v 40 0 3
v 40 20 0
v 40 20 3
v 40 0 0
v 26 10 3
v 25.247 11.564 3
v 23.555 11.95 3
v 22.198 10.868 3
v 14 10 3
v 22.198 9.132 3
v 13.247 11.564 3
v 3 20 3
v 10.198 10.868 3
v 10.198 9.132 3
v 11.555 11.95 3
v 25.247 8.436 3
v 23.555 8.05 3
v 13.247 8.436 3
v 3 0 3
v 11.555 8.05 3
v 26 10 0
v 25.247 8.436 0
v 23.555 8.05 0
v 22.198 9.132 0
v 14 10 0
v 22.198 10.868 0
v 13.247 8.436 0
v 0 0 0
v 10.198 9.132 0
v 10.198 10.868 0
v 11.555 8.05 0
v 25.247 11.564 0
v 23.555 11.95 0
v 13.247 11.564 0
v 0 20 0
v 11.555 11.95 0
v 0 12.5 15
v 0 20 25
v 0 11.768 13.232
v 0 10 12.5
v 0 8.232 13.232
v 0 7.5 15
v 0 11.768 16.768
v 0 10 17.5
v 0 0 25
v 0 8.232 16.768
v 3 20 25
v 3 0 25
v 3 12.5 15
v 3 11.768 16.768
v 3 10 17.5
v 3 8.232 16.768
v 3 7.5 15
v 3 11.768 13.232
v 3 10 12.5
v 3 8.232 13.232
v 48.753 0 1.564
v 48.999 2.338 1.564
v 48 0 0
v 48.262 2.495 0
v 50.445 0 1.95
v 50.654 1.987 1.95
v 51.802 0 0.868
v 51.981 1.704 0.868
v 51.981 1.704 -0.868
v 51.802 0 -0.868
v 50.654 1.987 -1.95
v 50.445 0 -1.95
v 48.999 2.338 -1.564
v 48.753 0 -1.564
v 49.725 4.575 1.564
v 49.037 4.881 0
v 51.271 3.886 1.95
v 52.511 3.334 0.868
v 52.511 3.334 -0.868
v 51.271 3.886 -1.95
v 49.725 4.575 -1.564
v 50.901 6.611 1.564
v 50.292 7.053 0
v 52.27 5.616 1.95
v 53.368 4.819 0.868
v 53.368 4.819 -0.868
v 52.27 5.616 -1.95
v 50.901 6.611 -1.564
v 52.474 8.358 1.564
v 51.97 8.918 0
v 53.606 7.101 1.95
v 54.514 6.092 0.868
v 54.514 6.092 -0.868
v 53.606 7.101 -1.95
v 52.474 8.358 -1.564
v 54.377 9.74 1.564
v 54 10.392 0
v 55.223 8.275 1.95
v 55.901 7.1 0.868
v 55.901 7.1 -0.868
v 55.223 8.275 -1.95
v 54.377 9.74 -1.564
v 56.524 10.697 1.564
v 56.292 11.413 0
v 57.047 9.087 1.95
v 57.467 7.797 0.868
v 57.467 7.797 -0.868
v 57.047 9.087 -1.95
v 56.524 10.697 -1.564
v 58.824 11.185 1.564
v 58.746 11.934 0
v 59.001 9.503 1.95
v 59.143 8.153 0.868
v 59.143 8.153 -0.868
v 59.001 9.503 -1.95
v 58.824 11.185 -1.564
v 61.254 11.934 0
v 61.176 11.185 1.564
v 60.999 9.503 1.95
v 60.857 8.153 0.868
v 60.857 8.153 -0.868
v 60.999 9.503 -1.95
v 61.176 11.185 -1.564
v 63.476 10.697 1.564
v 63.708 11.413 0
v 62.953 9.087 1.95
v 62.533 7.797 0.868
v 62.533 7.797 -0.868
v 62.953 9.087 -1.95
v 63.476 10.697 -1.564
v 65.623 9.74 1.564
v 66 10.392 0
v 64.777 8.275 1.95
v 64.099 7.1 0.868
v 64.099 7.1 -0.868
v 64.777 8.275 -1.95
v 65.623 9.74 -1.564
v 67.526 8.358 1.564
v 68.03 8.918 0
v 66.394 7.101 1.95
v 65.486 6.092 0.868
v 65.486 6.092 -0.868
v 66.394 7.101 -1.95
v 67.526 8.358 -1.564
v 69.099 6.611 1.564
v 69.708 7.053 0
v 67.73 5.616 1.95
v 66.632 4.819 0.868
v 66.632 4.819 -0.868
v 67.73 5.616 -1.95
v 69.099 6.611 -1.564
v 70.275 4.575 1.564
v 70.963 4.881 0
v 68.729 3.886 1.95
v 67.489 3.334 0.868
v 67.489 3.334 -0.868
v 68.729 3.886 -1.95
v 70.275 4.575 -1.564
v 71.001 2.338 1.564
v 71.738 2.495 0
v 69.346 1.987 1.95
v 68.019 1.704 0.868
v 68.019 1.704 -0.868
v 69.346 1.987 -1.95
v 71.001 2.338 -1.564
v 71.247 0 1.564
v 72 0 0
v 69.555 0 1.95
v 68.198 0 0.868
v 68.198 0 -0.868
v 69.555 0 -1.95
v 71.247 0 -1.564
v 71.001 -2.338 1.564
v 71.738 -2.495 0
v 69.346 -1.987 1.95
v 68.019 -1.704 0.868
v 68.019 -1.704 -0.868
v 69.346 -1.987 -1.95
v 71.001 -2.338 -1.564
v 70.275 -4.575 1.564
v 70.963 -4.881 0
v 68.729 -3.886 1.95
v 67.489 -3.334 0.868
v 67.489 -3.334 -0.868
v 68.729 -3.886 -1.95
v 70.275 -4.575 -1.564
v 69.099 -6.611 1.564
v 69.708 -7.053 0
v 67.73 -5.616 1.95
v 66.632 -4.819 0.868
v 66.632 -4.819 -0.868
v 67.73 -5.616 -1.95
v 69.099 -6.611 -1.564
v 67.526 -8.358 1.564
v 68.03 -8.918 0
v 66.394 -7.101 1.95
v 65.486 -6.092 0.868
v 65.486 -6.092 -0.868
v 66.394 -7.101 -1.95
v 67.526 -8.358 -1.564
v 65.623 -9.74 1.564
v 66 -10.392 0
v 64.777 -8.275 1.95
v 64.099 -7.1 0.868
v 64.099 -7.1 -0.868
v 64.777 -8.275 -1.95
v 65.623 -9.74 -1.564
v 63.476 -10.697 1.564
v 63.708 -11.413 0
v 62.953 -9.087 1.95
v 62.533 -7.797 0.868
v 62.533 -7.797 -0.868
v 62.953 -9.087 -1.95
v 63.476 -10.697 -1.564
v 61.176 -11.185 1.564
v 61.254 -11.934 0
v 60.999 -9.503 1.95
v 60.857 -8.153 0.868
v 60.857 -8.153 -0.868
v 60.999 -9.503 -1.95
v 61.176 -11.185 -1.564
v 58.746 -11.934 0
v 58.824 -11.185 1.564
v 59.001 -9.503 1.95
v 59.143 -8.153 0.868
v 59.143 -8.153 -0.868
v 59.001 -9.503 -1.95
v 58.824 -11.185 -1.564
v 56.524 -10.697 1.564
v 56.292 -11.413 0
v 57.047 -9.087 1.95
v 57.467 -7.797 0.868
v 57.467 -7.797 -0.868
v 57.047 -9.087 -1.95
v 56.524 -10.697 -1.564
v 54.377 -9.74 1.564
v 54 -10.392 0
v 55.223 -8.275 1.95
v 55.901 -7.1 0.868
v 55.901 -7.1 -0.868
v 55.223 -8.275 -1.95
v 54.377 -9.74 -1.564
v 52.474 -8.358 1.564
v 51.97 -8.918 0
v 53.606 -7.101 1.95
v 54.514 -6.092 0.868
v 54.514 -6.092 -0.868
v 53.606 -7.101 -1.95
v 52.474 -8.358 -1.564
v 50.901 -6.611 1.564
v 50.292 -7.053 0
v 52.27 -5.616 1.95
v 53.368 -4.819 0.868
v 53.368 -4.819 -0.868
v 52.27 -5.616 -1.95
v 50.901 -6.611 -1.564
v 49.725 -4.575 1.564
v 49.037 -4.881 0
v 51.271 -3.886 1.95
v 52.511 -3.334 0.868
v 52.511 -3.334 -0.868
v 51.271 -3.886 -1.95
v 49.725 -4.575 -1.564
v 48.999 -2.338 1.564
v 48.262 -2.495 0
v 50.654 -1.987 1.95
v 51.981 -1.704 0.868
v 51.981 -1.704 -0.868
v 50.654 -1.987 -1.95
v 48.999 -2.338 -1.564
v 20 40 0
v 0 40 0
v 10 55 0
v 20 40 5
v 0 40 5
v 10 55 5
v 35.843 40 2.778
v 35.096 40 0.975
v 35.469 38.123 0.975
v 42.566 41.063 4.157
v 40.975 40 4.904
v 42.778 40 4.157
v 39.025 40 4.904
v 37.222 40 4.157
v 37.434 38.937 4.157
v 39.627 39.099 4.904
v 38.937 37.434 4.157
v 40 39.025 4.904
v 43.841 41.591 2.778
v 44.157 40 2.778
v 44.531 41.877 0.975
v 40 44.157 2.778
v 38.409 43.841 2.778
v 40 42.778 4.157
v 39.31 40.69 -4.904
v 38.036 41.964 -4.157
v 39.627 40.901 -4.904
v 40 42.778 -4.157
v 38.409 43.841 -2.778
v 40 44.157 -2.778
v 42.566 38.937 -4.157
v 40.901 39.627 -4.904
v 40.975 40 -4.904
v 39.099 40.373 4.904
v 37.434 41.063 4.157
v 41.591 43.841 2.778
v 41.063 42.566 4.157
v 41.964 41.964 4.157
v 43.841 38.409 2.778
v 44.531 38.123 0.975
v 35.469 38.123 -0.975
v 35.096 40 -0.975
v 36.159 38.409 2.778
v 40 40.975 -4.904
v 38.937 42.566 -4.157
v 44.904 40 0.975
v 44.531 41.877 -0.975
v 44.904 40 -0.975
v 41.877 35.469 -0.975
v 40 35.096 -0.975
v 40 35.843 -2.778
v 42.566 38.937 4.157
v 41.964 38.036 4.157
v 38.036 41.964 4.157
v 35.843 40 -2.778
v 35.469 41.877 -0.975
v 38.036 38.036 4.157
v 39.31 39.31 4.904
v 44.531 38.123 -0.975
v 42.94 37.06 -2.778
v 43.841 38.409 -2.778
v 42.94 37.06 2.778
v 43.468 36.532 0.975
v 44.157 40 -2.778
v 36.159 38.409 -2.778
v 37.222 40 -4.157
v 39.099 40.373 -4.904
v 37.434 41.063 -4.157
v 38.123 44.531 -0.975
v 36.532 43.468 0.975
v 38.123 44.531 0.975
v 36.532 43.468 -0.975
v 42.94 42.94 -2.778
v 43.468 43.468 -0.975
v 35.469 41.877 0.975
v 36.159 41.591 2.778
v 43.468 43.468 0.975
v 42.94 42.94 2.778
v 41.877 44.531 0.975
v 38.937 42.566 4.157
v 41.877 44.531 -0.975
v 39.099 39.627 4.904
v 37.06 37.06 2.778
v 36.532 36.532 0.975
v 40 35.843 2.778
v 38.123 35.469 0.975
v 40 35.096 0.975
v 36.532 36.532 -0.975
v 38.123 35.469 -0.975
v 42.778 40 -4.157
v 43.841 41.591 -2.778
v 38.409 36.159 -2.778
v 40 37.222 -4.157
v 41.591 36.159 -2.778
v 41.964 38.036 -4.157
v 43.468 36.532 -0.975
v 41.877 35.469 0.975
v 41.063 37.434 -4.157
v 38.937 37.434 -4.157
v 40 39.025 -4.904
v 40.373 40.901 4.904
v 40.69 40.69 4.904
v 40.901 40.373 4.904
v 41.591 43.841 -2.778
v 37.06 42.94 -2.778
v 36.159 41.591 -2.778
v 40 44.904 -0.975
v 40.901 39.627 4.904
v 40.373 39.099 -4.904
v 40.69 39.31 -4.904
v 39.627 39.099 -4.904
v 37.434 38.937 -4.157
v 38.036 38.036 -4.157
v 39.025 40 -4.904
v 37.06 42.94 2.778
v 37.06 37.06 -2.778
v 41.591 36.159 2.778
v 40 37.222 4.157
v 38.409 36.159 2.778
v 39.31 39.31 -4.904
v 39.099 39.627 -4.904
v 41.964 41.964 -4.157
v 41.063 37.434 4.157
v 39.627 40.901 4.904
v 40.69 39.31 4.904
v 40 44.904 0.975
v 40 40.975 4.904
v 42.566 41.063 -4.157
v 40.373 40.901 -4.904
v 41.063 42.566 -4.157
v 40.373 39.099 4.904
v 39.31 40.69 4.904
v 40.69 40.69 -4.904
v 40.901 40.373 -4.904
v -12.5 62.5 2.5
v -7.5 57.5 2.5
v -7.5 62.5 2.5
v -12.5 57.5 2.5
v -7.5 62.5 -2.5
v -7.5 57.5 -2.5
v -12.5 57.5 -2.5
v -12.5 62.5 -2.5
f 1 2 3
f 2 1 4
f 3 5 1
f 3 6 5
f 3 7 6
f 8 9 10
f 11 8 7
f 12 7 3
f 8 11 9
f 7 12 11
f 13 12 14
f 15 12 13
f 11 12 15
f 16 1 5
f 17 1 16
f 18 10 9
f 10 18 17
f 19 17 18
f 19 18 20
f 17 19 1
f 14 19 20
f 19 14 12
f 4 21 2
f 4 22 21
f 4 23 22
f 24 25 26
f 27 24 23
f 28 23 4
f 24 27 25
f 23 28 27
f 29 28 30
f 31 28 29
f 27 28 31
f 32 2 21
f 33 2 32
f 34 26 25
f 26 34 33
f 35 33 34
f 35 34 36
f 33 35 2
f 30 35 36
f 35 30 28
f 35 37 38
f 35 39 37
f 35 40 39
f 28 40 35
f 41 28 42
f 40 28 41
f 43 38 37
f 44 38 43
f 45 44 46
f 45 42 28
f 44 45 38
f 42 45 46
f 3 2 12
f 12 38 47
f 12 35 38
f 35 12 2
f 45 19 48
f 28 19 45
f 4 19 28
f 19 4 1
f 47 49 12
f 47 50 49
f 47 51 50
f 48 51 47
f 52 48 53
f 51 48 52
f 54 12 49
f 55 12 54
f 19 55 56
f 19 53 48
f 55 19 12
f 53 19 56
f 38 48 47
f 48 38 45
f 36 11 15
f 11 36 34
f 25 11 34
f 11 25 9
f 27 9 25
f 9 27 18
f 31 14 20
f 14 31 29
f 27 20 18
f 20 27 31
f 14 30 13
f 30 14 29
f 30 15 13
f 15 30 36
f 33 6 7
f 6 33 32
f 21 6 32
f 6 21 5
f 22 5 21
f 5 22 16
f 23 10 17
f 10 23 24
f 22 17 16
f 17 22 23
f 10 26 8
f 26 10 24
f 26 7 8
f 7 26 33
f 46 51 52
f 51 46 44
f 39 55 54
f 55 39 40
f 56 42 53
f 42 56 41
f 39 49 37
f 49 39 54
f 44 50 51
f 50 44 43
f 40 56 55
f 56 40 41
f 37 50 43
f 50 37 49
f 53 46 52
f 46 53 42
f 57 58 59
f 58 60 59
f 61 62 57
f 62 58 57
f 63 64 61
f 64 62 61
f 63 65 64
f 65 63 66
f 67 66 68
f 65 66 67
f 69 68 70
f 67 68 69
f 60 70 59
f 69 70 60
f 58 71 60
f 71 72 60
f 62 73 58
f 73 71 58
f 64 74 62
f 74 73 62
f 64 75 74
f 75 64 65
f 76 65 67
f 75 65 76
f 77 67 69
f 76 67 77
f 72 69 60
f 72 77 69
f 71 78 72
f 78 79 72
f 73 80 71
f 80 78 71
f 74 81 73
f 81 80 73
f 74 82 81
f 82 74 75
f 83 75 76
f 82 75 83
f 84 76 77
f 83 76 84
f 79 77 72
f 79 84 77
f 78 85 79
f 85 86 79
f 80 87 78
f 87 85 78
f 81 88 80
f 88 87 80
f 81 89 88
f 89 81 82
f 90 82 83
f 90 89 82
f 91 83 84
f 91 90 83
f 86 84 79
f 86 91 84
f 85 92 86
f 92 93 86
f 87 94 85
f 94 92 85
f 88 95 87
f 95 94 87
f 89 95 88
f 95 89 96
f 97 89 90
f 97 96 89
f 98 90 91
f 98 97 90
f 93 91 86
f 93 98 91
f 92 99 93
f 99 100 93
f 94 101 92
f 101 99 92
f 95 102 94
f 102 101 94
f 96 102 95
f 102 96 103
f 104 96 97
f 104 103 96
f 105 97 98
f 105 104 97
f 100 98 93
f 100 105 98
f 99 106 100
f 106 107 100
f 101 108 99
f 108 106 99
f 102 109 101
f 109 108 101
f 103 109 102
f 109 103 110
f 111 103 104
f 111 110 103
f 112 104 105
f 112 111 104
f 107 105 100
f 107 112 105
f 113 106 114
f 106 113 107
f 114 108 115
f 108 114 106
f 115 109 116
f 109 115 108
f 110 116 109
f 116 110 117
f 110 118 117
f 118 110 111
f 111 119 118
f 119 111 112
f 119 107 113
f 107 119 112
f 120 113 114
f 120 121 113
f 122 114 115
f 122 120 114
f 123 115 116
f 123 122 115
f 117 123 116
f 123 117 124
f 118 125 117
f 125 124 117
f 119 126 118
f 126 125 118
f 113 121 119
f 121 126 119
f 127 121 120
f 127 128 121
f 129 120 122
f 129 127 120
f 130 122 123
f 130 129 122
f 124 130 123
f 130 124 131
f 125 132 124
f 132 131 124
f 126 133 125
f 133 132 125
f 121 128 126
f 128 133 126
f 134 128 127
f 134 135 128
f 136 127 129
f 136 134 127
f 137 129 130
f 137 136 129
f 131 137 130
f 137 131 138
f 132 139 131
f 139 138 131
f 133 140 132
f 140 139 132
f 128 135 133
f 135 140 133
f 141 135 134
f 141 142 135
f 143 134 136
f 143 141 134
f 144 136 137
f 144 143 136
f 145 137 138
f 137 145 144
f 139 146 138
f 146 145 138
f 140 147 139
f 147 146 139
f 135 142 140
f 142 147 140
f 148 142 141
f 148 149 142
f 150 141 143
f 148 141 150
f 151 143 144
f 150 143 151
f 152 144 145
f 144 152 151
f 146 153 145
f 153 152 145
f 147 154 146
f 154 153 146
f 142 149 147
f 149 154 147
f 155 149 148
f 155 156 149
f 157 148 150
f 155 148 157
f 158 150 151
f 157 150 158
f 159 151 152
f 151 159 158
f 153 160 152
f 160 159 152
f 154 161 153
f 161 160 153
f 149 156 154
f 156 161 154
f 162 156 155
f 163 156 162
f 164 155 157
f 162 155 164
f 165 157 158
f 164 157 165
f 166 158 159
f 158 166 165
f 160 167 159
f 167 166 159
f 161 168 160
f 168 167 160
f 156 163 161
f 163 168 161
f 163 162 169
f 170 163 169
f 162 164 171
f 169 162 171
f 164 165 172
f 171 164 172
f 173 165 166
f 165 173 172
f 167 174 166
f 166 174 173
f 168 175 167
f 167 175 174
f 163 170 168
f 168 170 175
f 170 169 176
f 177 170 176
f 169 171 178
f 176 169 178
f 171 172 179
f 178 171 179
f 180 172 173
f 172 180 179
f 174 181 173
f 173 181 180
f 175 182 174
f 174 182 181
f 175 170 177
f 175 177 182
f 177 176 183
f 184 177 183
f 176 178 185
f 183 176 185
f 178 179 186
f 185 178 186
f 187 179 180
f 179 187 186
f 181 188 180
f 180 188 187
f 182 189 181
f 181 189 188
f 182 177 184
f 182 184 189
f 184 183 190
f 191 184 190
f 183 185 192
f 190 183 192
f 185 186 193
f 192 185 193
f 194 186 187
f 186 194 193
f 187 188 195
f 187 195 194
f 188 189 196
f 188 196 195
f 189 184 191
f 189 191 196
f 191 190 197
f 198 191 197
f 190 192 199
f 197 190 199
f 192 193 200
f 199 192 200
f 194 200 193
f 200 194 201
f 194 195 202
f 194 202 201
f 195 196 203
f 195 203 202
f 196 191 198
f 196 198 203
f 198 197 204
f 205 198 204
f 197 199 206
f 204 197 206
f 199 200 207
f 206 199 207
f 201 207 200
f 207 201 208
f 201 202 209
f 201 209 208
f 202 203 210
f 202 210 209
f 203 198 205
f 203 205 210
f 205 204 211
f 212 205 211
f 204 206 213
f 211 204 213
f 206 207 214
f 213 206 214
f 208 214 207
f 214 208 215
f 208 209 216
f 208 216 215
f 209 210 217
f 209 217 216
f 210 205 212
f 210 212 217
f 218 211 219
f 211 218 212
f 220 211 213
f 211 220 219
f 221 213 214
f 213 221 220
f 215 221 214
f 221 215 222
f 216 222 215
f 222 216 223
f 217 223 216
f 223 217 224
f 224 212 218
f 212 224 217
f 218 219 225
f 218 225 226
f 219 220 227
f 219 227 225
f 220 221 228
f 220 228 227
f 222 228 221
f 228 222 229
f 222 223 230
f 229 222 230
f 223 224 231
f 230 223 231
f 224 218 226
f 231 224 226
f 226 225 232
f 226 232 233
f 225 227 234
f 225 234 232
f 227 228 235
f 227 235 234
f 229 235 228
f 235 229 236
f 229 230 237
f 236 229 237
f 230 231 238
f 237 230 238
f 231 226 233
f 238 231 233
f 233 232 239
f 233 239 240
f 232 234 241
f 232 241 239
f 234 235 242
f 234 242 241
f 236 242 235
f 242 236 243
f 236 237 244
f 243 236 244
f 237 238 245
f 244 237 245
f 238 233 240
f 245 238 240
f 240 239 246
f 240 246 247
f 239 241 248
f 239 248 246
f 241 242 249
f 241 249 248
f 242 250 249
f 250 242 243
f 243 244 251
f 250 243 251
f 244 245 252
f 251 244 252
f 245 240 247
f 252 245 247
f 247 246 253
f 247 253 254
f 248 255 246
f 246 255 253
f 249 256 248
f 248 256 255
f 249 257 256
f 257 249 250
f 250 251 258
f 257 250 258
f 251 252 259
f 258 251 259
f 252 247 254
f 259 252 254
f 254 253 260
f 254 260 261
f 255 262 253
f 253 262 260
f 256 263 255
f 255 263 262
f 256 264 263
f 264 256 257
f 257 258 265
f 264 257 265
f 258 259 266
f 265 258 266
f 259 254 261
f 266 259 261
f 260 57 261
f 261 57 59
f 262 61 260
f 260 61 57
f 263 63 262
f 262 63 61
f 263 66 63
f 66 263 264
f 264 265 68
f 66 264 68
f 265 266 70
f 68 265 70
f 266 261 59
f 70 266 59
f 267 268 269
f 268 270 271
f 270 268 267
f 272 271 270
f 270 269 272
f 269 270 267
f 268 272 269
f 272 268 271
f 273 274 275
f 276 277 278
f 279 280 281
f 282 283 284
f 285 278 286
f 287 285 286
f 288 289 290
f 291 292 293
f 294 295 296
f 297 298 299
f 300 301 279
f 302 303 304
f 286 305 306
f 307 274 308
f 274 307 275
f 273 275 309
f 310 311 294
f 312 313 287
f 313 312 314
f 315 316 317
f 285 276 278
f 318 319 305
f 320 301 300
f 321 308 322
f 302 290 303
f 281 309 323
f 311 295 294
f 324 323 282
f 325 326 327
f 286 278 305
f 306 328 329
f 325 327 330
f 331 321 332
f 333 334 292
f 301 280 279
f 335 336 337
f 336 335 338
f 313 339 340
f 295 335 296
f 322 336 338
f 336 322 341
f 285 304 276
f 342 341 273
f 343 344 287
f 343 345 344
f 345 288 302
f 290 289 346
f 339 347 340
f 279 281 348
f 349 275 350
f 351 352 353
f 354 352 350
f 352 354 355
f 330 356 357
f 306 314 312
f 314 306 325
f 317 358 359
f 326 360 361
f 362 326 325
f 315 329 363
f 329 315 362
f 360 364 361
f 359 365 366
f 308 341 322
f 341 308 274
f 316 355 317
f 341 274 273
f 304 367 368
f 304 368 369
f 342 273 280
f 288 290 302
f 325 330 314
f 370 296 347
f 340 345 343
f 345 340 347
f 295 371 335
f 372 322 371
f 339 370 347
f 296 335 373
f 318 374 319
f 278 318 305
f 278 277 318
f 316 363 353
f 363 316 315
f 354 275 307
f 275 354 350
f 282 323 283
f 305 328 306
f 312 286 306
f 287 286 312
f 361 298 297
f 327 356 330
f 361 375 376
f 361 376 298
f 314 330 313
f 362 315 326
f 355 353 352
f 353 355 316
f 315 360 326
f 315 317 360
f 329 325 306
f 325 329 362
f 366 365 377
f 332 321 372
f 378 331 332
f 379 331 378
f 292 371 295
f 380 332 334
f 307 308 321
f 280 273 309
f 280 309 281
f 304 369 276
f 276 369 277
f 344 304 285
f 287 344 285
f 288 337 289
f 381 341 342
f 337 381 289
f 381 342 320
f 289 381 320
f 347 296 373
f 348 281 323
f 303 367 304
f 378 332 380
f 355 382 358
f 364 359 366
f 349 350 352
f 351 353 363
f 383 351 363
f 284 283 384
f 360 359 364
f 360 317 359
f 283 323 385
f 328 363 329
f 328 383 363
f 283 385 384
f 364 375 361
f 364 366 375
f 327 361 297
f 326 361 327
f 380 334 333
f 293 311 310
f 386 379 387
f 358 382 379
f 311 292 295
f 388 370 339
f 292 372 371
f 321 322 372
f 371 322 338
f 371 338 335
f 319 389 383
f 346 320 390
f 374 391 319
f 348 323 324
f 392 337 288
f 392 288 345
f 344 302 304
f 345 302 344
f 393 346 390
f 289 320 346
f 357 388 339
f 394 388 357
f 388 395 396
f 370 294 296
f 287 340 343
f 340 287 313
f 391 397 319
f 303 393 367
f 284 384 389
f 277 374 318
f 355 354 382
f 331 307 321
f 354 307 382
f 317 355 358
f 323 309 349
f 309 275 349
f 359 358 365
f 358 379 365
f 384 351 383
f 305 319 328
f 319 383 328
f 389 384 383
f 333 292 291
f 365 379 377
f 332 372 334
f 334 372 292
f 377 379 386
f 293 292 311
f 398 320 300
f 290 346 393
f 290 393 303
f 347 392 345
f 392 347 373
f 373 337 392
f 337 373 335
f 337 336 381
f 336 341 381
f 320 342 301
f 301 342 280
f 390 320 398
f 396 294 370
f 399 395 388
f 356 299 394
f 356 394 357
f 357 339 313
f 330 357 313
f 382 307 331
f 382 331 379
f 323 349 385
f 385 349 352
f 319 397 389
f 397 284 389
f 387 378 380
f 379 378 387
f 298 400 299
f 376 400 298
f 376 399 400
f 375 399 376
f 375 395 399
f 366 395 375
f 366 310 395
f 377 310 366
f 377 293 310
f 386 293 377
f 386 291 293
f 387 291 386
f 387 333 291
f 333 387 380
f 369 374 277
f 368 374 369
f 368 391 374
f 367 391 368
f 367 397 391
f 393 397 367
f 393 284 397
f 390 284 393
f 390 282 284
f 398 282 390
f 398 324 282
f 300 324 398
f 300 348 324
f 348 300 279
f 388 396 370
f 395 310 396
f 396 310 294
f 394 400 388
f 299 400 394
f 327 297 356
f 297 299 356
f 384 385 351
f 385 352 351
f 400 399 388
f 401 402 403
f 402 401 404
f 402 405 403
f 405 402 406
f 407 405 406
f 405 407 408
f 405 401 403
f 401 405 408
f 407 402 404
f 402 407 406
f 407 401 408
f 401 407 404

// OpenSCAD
// a bracket with holes
w = 40; t = 3;
module hole(x, y, d=4) { translate([x, y, -1]) cylinder(h = t + 2, d = d); }
difference() {
  union() {
    cube([w, 20, t]);
    cube([t, 20, 25]);
  }
  for (i = [1:2]) hole(i * 12, 10);
  translate([-1, 10, 15]) rotate([0, 90, 0]) cylinder(h = t + 2, r = 2.5);
}
translate([60, 0, 0]) rotate_extrude() translate([10, 0]) circle(r = 2);
translate([0, 40, 0]) linear_extrude(height = 5) polygon([[0,0],[20,0],[10,15]]);
translate([40, 40, 0]) sphere(d = 10);
mirror([1, 0, 0]) translate([10, 60, 0]) cube(5, center = true);
